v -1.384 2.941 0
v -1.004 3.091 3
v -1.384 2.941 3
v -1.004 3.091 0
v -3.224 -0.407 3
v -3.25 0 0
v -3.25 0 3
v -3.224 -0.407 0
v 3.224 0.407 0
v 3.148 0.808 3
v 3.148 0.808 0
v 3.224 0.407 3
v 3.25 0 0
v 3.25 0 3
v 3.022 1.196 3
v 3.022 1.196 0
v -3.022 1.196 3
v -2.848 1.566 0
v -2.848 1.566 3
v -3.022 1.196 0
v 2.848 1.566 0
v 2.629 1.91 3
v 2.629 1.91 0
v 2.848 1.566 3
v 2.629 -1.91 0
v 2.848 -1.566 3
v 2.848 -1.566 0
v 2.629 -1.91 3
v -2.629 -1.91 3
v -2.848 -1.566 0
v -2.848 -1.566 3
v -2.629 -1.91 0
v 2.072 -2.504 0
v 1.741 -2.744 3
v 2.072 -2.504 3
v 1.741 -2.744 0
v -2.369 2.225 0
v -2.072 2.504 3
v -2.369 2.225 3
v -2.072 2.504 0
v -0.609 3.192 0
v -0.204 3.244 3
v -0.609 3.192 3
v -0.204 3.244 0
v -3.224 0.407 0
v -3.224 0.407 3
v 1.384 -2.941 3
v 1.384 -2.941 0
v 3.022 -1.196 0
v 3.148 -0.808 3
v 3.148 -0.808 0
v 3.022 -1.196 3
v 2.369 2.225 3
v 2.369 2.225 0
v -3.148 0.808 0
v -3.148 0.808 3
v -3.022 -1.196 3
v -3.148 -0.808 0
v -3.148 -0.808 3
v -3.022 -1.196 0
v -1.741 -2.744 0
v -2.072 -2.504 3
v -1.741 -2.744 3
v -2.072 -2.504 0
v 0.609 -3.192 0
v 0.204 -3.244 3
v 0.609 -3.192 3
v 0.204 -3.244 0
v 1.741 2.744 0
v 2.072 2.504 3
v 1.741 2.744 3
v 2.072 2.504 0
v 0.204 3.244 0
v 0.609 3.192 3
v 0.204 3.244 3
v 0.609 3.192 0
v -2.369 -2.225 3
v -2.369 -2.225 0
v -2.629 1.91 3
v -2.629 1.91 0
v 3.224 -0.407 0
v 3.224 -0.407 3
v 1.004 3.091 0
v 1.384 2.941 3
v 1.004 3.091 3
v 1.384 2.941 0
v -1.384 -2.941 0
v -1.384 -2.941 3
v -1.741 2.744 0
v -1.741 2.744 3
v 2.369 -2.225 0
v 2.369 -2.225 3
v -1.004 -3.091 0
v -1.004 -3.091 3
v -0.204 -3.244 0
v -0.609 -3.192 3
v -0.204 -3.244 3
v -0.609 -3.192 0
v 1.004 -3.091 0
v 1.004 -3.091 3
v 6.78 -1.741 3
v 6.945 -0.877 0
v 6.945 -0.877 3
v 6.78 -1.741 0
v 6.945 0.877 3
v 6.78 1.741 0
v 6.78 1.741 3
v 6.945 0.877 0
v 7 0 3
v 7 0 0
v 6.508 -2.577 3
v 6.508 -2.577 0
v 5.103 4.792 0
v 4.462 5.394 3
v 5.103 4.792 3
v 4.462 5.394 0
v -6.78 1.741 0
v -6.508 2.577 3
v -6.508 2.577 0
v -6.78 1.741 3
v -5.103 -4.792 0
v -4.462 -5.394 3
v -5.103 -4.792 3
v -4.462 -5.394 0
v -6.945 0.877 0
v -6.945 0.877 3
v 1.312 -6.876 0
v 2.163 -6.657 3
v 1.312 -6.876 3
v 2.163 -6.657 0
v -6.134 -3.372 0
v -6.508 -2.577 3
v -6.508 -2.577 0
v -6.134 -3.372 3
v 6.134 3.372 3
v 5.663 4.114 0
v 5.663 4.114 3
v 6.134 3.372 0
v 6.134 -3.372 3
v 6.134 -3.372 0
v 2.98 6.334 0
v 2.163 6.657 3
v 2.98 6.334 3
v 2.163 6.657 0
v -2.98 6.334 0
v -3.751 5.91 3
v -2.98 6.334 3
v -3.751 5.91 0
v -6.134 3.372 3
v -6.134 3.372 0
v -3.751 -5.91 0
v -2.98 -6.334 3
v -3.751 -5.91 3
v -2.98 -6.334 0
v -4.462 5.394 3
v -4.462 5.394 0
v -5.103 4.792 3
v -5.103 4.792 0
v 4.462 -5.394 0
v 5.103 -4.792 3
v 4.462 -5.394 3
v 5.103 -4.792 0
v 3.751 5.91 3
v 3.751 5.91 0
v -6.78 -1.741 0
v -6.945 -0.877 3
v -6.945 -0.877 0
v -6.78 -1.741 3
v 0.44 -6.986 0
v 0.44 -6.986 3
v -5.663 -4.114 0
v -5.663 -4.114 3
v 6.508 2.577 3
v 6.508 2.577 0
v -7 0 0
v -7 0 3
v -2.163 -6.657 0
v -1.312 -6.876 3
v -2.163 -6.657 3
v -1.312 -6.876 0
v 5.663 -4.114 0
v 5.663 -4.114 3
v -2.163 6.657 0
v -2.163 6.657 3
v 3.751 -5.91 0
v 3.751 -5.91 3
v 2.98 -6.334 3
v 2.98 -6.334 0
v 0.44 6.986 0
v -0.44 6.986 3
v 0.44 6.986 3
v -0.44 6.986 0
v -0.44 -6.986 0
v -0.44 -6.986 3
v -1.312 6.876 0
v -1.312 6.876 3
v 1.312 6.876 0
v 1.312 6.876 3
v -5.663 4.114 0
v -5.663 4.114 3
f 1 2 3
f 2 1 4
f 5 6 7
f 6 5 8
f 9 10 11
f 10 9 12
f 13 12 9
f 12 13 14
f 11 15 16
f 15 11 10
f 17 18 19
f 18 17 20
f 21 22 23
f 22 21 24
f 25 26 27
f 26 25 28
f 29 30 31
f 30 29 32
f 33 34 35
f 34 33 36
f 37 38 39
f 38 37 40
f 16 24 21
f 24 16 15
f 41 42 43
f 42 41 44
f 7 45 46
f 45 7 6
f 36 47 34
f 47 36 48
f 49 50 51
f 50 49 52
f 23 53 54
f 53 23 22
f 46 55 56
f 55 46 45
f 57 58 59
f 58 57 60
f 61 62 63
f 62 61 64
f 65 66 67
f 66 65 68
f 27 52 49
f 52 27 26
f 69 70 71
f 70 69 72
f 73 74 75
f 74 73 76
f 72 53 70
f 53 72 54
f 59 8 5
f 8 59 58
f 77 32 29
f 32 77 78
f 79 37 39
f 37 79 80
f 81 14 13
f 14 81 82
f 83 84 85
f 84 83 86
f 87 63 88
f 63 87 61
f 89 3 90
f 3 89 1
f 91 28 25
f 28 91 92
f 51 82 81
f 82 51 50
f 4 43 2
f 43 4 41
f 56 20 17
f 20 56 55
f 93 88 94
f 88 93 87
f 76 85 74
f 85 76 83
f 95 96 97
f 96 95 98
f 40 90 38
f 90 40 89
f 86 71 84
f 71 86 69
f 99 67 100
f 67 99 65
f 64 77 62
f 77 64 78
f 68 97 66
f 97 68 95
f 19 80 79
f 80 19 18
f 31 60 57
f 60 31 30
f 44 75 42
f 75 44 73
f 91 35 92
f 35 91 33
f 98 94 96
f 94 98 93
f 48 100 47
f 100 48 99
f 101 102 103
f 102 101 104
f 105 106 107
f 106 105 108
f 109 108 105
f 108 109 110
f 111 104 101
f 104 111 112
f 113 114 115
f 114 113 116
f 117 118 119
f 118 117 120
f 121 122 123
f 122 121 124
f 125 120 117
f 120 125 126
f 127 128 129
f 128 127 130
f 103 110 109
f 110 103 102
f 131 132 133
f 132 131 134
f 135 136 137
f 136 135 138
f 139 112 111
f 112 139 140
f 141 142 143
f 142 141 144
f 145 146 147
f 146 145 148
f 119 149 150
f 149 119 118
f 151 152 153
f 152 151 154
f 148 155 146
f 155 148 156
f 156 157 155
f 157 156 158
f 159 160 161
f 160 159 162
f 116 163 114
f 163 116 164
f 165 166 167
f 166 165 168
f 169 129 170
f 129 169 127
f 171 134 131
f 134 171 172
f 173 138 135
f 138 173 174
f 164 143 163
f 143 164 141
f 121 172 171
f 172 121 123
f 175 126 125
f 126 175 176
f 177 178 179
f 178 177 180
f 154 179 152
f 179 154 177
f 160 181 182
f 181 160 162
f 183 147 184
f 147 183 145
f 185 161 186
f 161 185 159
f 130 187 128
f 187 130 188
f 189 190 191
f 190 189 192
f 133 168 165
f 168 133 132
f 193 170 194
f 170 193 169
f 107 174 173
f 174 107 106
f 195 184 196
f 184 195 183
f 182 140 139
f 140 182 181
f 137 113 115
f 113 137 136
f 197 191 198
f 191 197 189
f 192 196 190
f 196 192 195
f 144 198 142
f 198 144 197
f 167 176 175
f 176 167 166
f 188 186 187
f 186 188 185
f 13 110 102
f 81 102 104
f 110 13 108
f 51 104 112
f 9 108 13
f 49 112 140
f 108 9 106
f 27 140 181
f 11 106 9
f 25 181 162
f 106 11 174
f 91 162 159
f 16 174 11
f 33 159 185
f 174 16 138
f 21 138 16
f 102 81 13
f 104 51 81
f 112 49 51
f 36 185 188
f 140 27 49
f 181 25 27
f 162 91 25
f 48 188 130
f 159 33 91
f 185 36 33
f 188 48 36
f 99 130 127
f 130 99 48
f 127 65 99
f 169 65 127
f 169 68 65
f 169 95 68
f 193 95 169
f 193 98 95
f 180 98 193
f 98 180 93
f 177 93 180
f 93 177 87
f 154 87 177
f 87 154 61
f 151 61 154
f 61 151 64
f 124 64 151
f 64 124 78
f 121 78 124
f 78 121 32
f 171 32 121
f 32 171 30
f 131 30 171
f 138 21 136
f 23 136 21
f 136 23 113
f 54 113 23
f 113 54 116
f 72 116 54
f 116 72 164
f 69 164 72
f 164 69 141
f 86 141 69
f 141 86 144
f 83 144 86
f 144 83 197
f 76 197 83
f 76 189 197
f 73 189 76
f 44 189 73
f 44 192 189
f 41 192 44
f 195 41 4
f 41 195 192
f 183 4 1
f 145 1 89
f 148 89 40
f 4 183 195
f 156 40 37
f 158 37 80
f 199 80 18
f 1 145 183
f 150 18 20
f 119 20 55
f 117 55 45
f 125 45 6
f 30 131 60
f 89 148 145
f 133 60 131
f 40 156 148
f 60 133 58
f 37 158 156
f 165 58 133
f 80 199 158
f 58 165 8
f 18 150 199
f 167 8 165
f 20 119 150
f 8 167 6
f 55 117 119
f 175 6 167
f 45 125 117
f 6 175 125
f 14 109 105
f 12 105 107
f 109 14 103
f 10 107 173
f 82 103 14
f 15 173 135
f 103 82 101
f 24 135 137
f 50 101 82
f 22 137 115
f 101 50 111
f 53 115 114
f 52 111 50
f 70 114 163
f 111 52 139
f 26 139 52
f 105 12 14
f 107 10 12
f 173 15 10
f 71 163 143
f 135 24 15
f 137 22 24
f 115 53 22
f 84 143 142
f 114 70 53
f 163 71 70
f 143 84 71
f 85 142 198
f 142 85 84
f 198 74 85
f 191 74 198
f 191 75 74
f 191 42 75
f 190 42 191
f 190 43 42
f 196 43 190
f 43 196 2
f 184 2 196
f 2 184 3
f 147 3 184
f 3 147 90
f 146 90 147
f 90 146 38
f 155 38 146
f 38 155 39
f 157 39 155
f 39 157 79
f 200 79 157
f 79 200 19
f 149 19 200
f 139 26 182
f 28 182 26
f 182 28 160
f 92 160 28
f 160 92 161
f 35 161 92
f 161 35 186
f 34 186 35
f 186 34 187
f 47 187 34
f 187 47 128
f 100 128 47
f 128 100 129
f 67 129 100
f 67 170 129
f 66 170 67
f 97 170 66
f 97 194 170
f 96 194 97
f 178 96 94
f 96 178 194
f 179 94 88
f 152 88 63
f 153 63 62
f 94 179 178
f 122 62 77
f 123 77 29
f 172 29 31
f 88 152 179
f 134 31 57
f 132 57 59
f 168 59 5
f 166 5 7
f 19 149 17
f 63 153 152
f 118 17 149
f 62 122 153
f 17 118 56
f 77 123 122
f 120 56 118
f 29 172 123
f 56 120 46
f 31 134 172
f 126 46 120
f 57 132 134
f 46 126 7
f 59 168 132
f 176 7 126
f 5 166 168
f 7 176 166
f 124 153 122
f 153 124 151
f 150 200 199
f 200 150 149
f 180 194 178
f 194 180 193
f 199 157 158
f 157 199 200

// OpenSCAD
$fn = 50;


difference() {
	union() {
		*color(alpha = 1.0000000000, c = "gray") {
			translate(v = [0, 7, 0]) {
				linear_extrude(height = 1) {
					text(font = "Arial:style=Bold", halign = "center", size = 4.5000000000, text = "COMMENT plate main", valign = "center");
				}
			}
		}
		*color(alpha = 1.0000000000, c = "gray") {
			translate(v = [0, 14, 0]) {
				linear_extrude(height = 1) {
					text(font = "Arial:style=Bold", halign = "center", size = 4.5000000000, text = "COMMENT description oobb_plate_shape_p_type_3_depth_1_width_1_height_3_thickness_true_both_holes", valign = "center");
				}
			}
		}
		cylinder(h = 3, r = 7.0000000000);
	}
	union() {
		*color(alpha = 1.0000000000, c = "gray") {
			translate(v = [0, 7, 0]) {
				linear_extrude(height = 1) {
					text(font = "Arial:style=Bold", halign = "center", size = 4.5000000000, text = "COMMENT holes main", valign = "center");
				}
			}
		}
		*color(alpha = 1.0000000000, c = "gray") {
			translate(v = [0, 14, 0]) {
				linear_extrude(height = 1) {
					text(font = "Arial:style=Bold", halign = "center", size = 4.5000000000, text = "COMMENT description oobb_holes_shape_n_type_1_width_1_height_3_thickness_true_both_holes", valign = "center");
				}
			}
		}
		translate(v = [0, 0, -50]) {
			cylinder(h = 100, r = 3.2500000000);
		}
		translate(v = [0, 0, -50]) {
			cylinder(h = 100, r = 1.8000000000);
		}
	}
}
